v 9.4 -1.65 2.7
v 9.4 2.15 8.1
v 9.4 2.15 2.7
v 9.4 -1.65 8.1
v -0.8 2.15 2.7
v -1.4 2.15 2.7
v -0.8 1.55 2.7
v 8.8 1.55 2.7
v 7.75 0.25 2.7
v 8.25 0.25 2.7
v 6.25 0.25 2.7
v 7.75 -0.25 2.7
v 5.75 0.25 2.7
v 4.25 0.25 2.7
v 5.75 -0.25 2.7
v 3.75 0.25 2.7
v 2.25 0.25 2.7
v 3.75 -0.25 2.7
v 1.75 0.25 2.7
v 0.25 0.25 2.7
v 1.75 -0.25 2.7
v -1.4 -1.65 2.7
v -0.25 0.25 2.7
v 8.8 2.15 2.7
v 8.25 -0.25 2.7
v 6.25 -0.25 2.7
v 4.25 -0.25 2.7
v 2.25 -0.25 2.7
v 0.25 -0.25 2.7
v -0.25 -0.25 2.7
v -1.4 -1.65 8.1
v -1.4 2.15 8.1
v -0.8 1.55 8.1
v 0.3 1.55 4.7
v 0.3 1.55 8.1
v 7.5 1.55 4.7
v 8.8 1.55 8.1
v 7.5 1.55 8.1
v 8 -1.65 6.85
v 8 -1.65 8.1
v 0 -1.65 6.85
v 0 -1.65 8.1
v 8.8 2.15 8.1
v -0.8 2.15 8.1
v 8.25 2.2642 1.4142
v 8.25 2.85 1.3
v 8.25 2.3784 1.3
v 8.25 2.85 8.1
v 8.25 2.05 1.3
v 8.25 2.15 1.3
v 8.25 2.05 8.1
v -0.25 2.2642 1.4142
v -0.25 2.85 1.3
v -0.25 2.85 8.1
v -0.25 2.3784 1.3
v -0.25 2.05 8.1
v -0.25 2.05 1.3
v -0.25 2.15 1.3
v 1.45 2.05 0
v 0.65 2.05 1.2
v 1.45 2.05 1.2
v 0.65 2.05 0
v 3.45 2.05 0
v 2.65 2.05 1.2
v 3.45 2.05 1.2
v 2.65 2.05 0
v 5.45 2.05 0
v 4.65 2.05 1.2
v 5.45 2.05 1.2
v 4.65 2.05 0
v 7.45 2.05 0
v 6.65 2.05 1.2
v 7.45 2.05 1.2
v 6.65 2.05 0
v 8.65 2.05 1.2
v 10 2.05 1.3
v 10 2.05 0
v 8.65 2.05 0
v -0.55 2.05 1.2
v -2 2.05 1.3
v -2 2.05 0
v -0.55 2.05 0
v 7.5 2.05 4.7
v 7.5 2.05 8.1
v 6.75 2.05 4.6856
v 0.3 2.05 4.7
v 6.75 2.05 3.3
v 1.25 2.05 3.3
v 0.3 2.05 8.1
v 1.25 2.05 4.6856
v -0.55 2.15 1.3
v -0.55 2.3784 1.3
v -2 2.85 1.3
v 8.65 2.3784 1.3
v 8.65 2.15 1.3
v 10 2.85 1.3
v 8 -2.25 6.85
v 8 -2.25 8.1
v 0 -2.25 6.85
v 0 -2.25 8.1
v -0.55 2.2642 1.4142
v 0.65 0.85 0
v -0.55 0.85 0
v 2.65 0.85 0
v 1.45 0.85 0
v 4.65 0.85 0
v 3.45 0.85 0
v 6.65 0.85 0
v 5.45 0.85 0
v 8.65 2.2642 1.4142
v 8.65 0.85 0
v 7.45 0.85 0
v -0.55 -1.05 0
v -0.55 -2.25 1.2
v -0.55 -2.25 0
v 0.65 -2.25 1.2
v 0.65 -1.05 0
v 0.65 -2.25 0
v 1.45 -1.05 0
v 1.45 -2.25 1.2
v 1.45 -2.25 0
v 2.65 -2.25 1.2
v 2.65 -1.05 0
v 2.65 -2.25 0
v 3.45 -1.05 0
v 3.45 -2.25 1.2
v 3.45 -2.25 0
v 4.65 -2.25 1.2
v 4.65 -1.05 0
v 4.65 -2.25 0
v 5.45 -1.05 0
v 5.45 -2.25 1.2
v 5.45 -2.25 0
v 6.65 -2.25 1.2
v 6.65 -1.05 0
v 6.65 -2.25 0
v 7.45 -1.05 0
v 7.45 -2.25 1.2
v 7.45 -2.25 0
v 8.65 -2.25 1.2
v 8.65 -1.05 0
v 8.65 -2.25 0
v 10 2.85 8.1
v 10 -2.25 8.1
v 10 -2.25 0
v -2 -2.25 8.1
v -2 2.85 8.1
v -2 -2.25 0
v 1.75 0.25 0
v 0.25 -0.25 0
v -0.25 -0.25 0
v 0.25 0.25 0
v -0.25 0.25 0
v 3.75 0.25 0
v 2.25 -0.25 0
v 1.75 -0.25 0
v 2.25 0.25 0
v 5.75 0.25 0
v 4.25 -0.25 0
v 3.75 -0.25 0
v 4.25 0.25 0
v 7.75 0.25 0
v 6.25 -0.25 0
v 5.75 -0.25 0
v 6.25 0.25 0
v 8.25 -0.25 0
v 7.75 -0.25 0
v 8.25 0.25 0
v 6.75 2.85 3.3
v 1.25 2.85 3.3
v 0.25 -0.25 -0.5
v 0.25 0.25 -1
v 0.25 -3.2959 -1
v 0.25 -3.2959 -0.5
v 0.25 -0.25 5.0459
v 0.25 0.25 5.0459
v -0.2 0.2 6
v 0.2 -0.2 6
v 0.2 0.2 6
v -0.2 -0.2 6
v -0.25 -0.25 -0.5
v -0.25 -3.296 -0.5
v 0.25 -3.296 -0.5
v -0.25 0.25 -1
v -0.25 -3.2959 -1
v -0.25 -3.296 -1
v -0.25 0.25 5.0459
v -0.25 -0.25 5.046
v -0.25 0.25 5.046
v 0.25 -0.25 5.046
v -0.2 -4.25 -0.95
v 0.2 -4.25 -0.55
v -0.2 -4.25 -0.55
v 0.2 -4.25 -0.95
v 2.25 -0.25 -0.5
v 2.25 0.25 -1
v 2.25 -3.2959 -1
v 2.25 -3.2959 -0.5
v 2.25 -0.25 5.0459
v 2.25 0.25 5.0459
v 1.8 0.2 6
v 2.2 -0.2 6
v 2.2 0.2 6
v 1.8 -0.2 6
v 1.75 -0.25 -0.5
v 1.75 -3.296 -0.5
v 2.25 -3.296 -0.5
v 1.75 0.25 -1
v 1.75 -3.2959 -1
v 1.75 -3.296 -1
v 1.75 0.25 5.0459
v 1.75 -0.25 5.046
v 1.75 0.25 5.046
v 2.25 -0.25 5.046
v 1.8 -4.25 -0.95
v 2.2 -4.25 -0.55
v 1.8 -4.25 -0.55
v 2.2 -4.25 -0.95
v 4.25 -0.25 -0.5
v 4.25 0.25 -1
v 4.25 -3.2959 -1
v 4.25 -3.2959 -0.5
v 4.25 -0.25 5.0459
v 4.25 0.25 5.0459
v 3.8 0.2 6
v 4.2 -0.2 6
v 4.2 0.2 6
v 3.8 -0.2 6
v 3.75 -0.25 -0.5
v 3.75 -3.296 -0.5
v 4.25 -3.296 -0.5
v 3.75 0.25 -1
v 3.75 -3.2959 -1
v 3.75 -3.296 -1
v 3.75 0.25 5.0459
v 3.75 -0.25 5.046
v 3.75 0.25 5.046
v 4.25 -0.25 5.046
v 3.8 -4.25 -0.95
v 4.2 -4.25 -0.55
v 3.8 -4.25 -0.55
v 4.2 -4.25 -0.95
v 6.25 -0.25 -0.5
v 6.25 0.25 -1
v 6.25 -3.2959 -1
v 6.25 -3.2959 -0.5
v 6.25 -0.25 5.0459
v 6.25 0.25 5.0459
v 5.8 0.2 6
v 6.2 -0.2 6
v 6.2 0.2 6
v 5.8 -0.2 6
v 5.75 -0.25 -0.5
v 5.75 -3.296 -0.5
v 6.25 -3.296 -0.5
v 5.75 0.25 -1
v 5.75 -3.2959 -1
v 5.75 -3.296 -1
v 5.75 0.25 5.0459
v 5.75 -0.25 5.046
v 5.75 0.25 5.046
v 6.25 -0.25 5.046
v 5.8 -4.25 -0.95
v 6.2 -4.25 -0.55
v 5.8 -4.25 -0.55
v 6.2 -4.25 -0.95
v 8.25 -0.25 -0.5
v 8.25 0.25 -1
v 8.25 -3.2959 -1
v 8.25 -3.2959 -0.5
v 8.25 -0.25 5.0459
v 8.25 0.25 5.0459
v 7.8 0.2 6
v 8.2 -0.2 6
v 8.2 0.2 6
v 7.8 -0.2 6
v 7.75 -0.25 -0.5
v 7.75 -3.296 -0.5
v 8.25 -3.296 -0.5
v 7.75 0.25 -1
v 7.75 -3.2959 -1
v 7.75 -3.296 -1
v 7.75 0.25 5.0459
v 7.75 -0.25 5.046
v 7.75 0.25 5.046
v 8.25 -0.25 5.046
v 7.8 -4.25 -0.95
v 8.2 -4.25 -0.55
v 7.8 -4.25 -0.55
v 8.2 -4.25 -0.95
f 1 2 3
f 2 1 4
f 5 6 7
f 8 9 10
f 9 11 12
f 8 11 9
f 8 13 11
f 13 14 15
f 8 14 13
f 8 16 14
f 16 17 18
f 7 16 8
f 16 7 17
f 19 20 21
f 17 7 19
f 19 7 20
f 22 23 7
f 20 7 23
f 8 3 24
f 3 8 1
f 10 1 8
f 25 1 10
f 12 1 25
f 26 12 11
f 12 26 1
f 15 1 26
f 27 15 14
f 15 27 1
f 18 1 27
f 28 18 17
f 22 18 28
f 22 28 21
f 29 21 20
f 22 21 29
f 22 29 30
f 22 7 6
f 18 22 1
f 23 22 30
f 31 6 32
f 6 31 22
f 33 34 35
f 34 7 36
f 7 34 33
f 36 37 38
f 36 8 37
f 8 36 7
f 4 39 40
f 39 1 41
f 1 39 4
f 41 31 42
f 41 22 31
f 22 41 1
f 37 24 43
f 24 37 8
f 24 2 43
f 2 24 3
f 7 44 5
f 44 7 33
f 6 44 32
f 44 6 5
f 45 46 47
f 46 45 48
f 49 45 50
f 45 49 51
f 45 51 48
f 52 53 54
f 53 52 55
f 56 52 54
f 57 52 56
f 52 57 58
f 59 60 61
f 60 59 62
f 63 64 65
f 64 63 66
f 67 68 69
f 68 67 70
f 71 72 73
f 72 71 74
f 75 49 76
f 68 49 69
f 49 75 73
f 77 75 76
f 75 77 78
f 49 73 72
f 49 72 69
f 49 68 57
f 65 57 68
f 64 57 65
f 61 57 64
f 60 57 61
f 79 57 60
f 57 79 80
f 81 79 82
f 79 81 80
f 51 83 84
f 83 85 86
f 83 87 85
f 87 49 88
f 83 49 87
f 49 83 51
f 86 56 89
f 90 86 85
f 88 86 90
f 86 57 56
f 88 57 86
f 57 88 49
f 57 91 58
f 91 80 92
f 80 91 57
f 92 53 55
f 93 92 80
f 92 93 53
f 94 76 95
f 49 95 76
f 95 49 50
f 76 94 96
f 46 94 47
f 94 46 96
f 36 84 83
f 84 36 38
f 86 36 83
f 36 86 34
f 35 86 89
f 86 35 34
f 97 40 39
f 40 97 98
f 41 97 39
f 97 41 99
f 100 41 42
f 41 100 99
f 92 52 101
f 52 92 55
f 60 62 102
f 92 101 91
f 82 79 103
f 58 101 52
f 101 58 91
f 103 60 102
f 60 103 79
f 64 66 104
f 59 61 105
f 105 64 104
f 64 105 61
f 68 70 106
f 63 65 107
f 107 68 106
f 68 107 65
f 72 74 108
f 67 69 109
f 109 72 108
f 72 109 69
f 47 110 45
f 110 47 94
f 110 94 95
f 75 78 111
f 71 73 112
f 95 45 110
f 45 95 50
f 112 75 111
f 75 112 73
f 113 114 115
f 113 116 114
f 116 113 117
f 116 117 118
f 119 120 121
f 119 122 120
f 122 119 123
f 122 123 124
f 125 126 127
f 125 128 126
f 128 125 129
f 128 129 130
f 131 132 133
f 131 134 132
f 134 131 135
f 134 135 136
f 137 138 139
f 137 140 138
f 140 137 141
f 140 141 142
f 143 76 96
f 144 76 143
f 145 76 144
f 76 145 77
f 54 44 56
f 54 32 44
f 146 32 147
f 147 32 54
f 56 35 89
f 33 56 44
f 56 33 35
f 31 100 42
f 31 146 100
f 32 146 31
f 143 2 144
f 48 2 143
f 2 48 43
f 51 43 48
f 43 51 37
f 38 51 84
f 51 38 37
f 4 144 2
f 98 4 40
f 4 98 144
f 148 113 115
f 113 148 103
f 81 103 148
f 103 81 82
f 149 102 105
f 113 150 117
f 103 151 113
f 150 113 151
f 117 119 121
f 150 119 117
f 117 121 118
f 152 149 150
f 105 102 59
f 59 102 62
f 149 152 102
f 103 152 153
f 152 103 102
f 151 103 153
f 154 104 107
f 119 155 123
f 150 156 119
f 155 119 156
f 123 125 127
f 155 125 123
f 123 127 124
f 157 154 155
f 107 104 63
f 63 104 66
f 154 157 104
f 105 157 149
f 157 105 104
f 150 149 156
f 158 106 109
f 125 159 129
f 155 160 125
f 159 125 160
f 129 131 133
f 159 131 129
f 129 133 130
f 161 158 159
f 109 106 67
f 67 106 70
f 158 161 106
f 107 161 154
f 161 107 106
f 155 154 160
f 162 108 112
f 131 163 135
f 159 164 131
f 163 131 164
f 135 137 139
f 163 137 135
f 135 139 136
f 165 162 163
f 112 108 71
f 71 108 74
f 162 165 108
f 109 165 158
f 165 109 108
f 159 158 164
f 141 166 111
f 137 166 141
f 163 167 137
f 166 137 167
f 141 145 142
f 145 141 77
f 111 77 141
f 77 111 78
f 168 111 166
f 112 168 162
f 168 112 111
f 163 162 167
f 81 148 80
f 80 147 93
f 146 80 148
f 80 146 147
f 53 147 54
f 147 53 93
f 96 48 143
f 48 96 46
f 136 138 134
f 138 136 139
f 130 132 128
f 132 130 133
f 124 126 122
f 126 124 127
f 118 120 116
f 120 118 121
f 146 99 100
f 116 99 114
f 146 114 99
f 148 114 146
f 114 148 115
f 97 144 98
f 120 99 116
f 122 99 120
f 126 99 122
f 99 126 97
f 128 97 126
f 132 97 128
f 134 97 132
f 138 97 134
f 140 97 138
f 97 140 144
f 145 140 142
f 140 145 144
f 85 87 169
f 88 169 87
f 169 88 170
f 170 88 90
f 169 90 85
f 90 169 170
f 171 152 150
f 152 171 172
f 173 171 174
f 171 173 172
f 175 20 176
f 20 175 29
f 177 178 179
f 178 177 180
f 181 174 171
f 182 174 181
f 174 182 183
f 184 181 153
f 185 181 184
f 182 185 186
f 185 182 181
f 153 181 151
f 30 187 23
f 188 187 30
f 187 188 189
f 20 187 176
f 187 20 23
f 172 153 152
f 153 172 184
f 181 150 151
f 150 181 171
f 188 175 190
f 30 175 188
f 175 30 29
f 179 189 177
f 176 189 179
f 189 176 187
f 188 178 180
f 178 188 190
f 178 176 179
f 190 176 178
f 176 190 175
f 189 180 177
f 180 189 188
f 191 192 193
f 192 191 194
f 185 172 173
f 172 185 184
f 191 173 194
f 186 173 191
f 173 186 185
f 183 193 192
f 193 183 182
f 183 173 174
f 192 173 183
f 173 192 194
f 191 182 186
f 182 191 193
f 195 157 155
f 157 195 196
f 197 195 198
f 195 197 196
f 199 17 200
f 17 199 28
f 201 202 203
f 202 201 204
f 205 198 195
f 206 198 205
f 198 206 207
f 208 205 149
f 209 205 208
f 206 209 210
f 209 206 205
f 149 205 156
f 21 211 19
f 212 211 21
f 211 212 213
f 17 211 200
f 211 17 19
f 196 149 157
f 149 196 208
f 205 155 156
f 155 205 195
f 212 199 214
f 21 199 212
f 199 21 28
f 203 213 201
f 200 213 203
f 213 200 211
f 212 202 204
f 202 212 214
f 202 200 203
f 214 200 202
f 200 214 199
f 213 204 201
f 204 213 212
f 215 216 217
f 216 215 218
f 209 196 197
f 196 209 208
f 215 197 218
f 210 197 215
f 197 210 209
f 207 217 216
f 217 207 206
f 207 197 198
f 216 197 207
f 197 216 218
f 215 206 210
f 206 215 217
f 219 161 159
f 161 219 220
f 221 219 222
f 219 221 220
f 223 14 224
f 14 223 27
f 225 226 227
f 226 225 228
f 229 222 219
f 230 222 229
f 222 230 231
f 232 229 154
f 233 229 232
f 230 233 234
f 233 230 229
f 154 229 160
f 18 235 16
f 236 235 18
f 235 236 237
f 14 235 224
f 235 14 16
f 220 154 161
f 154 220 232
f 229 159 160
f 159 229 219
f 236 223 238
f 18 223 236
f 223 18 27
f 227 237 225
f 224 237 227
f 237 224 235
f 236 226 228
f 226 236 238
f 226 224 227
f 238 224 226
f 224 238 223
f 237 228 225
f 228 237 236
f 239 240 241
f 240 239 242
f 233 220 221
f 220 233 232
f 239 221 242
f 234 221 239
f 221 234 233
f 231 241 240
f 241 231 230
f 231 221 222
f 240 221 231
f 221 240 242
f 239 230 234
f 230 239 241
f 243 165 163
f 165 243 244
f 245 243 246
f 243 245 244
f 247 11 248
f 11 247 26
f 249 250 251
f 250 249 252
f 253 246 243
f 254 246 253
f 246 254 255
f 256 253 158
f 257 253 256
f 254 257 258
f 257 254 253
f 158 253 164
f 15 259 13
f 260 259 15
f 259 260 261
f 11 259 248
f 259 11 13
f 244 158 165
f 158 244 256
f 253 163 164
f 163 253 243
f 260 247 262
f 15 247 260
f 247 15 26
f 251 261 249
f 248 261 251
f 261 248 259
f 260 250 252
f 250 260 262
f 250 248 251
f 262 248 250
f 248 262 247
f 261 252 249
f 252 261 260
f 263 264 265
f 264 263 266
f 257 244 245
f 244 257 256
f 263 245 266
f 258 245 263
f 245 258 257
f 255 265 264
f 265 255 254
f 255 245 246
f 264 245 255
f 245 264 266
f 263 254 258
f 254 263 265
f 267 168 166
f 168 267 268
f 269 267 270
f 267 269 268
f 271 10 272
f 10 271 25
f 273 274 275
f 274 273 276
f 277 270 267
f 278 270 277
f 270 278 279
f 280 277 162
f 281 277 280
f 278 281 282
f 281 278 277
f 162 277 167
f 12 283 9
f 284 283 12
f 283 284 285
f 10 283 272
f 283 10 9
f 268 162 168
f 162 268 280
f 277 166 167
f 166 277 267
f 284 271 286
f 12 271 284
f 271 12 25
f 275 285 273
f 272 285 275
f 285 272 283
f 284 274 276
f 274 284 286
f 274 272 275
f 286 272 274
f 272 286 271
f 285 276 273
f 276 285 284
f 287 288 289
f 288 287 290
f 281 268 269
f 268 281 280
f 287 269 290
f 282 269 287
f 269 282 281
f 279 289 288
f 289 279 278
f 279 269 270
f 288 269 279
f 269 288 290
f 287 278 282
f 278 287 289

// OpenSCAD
module pin_01(pin_heigth=9,pin_size=0.5,pin_angle=3,pin_chanfer=0.05){
    epsilon=0.01;
    difference(){
        cube([pin_size,pin_size,pin_heigth]);
        translate([-epsilon,pin_size-pin_chanfer,pin_heigth])rotate([pin_angle,0,0])translate([0,0,-pin_heigth])cube([pin_size+2*epsilon,pin_size,pin_heigth]);
        translate([-epsilon,pin_chanfer,pin_heigth])rotate([-pin_angle,0,0])translate([0,-pin_size,-pin_heigth])cube([pin_size+2*epsilon,pin_size,pin_heigth]);     
        translate([pin_size-pin_chanfer,-epsilon,pin_heigth])rotate([0,-pin_angle,0])translate([0,0,-pin_heigth])cube([pin_size,pin_size+2*epsilon,pin_heigth]);
        translate([pin_chanfer,-epsilon,pin_heigth])rotate([0,pin_angle,0])translate([-pin_size,0,-pin_heigth])cube([pin_size,pin_size+2*epsilon,pin_heigth]);     
    }
}
module pin_02(pin_heigth=9,pin_size=0.5,pin_angle=3,pin_chanfer=0.05){
    epsilon=0.01;
    difference(){
        cube([pin_size,pin_size,pin_heigth]);
        translate([-epsilon,pin_size-pin_chanfer,0])rotate([-pin_angle,0,0])cube([pin_size+2*epsilon,pin_size,pin_heigth]);
        translate([-epsilon,pin_chanfer,0])rotate([pin_angle,0,0])translate([0,-pin_size,0])cube([pin_size+2*epsilon,pin_size,pin_heigth]);     
        translate([pin_size-pin_chanfer,-epsilon,0])rotate([0,pin_angle,0])cube([pin_size,pin_size+2*epsilon,pin_heigth]);
        translate([pin_chanfer,-epsilon,0])rotate([0,-pin_angle,0])translate([-pin_size,0,0])cube([pin_size,pin_size+2*epsilon,pin_heigth]);
    }
}
module pin(pin_heigth=9,pin_size=0.5,pin_angle=3,pin_chanfer=0.05)
{
    translate([0,0,pin_heigth/2-1.5]) pin_01(pin_heigth/2+2);
    translate([0,-4,4.5-1.5])  rotate([270,0,0]) pin_02(pin_heigth/2);
}


$fn=360;

epsilon = 1e-3;
translate([-2,-2.25,0])union(){
    difference(){
        cube([12,5.1,8.1]);
        union(){
            translate([0.6,0.6,2.7])union(){
                cube([12-2*0.6,3.2,5.4+2*epsilon]);
                translate([10.2,0.6,0])cube([0.6,3.2,5.4+2*epsilon]);
                translate([0,0.6,0])cube([0.6,3.2,5.4+2*epsilon]);
            }
            translate([1.75,4.3,-1])cube([8.5,2,12]);
            translate([-epsilon,4.3,-epsilon])cube([12+2*epsilon,0.9+epsilon,1.3+epsilon]);
            translate([2.3,3.7,4.7])cube([7.2,1,3.4+epsilon]);
            translate([2,-epsilon,6.85])cube([8,1,1.25+epsilon]);
            translate([1.45,3.1,0])rotate([-45,0,0])cube([1.2,3,2]);
            translate([3.45,3.1,0])rotate([-45,0,0])cube([1.2,3,2]);
            translate([5.45,3.1,0])rotate([-45,0,0])cube([1.2,3,2]);
            translate([7.45,3.1,0])rotate([-45,0,0])cube([1.2,3,2]);     
            
            translate([9.45,3.1,0])rotate([-45,0,0])cube([1.2,3,2]);     
            
            translate([1.45,-.8,2])rotate([225,0,0])cube([1.2,3,4]);
            translate([3.45,-.8,2])rotate([225,0,0])cube([1.2,3,4]);
            translate([5.45,-.8,2])rotate([225,0,0])cube([1.2,3,4]);
            translate([7.45,-.8,2])rotate([225,0,0])cube([1.2,3,4]);
            
            translate([9.45,-.8,2])rotate([225,0,0])cube([1.2,3,4]);

        }
    }
    translate([3.25,3.8,3.3])
    difference(){
        cube([5.5,1.3,1.4]);
        translate([-0.5,1.3,0])rotate([30,0,0])cube([6.5,1.3,5]);
    }
    translate([1.75,2,-3.5])pin();
    translate([3.75,2,-3.5])pin();
    translate([5.75,2,-3.5])pin();
    translate([7.75,2,-3.5])pin();
    translate([9.75,2,-3.5])pin();
}
